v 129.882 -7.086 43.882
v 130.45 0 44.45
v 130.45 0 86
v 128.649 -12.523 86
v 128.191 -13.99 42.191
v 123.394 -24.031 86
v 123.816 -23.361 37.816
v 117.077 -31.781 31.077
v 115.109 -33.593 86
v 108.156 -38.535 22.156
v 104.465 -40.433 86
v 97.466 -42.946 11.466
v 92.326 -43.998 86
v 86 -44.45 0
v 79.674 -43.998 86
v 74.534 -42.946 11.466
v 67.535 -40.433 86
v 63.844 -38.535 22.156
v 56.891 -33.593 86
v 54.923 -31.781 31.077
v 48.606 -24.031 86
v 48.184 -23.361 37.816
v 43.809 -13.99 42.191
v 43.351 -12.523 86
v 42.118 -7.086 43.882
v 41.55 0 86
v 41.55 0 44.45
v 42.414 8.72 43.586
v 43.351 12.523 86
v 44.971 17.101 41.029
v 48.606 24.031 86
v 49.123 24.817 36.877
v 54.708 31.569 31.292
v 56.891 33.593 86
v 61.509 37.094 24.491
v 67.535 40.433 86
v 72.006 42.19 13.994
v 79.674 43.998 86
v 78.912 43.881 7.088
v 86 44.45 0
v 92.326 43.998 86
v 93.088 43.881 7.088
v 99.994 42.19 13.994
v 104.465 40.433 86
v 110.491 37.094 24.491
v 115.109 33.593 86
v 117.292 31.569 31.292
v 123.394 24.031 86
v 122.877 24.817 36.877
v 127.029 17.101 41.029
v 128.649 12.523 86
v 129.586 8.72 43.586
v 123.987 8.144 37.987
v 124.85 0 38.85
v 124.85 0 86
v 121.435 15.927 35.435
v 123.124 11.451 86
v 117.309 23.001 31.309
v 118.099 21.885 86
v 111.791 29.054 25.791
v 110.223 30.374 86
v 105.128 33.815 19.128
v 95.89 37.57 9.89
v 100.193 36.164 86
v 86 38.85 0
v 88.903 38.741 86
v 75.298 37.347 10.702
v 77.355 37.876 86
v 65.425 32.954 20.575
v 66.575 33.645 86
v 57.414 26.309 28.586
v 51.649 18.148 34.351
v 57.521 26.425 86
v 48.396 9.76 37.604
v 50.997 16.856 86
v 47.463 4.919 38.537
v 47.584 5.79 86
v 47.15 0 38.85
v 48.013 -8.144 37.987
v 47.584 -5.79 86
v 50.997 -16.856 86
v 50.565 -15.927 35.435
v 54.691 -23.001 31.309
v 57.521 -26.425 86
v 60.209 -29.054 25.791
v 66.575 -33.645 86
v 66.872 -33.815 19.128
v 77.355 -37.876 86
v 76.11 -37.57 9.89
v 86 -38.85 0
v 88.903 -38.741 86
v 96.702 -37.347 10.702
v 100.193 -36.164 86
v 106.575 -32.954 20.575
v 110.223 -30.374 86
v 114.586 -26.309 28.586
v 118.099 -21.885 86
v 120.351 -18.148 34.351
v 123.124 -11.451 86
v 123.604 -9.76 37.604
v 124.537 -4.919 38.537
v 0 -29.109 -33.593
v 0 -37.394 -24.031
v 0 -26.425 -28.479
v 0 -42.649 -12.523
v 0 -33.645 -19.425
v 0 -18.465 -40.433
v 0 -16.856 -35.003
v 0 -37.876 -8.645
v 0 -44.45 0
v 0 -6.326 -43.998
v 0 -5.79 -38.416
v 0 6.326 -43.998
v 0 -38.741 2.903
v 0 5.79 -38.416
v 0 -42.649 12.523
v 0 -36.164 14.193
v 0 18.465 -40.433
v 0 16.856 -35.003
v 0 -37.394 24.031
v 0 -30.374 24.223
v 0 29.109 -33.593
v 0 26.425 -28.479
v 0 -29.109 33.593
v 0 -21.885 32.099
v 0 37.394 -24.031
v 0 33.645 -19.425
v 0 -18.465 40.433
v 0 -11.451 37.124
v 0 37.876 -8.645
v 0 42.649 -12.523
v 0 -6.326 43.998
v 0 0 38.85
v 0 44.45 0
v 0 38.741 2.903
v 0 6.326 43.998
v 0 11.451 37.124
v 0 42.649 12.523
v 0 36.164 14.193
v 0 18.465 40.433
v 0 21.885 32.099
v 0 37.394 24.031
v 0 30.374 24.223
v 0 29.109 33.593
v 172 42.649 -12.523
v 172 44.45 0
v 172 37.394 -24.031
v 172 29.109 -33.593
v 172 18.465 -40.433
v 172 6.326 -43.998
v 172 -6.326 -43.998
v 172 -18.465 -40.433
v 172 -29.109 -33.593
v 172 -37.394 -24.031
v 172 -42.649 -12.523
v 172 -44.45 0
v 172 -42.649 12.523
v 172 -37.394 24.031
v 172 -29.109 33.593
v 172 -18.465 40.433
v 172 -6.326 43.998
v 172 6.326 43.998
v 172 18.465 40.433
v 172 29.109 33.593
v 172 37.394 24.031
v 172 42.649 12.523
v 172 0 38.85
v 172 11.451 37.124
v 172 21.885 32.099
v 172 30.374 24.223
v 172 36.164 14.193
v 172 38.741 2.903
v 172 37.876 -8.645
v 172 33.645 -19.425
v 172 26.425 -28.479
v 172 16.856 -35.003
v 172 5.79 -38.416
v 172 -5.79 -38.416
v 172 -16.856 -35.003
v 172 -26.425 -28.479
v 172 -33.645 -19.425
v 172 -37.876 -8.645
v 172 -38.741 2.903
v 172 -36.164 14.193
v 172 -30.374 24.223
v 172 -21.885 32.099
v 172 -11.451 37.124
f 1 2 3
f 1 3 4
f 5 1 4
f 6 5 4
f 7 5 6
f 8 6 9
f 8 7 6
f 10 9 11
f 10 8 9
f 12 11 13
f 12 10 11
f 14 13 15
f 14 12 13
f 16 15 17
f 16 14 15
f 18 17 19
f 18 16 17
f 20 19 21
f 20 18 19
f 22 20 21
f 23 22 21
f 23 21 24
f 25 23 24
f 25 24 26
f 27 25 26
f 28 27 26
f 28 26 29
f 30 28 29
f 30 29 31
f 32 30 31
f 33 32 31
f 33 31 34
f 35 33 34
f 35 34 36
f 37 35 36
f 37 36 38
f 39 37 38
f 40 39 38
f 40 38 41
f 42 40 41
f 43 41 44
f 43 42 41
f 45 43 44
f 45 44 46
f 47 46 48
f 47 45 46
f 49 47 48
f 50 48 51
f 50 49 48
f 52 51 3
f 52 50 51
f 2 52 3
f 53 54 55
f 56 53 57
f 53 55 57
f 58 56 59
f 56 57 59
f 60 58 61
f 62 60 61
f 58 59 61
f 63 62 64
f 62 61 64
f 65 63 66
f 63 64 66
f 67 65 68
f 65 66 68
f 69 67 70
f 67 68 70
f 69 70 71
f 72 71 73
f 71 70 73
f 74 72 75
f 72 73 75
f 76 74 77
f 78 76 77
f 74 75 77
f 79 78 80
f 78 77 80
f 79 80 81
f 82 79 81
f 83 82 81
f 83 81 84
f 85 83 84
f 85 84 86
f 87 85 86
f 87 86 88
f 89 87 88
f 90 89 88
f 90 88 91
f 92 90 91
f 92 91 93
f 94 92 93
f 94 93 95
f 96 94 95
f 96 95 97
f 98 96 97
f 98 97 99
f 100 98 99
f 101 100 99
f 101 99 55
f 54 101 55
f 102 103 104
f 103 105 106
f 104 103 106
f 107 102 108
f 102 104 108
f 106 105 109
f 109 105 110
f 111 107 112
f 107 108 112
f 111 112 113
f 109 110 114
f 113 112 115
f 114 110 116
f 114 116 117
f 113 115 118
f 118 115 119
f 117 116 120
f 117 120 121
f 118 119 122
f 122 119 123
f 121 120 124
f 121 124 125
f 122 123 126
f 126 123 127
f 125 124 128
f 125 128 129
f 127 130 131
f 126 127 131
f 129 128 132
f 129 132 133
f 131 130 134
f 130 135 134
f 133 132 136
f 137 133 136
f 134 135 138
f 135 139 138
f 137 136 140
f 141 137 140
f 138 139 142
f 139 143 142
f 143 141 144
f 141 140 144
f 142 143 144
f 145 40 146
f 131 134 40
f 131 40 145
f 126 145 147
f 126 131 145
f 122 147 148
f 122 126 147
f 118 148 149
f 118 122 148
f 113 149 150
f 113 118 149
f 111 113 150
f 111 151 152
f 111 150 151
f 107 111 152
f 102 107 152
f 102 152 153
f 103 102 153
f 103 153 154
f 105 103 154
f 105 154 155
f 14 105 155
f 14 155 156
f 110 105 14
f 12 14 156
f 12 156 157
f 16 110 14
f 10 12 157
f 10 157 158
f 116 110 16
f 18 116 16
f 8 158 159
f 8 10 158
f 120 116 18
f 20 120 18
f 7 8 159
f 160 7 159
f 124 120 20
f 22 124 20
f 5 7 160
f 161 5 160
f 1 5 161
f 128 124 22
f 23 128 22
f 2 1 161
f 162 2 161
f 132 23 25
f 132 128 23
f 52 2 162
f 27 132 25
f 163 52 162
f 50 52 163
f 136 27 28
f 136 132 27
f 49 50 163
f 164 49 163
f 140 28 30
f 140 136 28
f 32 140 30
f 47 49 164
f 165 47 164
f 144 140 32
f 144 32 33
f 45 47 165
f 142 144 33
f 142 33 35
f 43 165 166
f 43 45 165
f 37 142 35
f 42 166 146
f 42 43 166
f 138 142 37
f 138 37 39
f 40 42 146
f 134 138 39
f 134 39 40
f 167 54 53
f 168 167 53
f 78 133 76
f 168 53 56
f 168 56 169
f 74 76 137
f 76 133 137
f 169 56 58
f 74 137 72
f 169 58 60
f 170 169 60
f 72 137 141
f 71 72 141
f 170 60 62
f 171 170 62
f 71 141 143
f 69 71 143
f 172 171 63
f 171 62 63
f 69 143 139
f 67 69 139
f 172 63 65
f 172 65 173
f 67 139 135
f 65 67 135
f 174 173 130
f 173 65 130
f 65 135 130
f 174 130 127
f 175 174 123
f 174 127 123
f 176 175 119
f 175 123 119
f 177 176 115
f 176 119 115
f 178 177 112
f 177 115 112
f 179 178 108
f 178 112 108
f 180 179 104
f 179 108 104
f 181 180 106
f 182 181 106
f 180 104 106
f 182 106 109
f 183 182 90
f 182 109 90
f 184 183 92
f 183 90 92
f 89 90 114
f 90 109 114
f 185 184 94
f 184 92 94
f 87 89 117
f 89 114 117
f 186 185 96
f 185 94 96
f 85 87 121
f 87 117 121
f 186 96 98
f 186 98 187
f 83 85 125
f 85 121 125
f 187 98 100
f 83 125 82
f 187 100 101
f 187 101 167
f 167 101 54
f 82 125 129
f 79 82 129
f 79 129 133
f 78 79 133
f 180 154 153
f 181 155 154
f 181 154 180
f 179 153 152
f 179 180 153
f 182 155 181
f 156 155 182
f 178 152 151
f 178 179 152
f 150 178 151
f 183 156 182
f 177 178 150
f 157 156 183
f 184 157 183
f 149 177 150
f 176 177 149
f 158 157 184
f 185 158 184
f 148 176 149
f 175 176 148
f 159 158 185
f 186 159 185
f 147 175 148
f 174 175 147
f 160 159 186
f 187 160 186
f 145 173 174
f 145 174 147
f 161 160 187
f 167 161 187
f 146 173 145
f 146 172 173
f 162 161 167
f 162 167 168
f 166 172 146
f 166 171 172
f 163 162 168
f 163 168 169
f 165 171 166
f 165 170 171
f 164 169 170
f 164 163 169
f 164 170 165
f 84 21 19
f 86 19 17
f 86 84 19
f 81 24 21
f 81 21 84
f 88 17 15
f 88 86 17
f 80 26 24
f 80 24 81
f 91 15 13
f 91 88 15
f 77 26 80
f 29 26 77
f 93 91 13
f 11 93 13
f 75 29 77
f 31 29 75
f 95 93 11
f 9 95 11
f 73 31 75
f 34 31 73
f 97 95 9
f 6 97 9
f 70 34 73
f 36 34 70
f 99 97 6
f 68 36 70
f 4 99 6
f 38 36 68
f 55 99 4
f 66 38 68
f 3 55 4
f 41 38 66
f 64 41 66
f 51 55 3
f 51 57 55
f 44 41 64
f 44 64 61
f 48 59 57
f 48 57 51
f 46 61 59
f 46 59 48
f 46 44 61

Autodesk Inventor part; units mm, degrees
ref_plane "YZ Plane" through (0, 0, 0) normal (1, 0, 0) x (0, 1, 0)
ref_plane "XZ Plane" through (0, 0, 0) normal (0, 1, 0) x (-1, 0, 0)
ref_plane "XY Plane" through (0, 0, 0) normal (0, 0, 1) x (1, 0, 0)
sketch "Sketch1" plane through (0, 0, 0) normal (1, 0, 0) x (0, 1, 0)
  circle A0 centre (0, 0) radius 44.45
  dimension "d0" = 88.9
extrude "Extrude1" add sketch "Sketch1" along normal blind 172
sketch "Sketch2" plane through (0, 0, 0) normal (0, 0, 1) x (1, 0, 0)
  line L0 (0, 44.45) -> (0, -44.45) projected
  line L1 (172, 44.45) -> (172, -44.45) projected
  line L2 (0, 0) -> (172, 0) construction
  circle A0 centre (86, 0) radius 44.45
  dimension "d3" = 88.9
extrude "Extrude2" add sketch "Sketch2" along normal blind 86
sketch "Sketch3" plane through (0, 0, 0) normal (-1, 0, 0) x (0, 0, 1)
  circle A0 centre (0, 0) radius 44.45 projected
  circle A1 centre (0, 0) radius 38.85
  dimension "d6" = 77.7
extrude "Extrude3" cut sketch "Sketch3" against normal through all contours A1
sketch "Sketch4" plane through (86, 0, 86) normal (0, 0, 1) x (1, 0, 0)
  circle A0 centre (0, 0) radius 44.45 projected
  circle A1 centre (0, 0) radius 38.85
  dimension "d9" = 77.7
extrude "Extrude4" cut sketch "Sketch4" against normal up to next contours A1
equation "\"d0\" = d"
equation "\"d1\" = 2 * a"
equation "\"d3\" = d"
equation "\"d4\" = a"
equation "\"d6\" = d - 2 * s1"
equation "\"d7\" = a"
equation "\"d9\" = d - 2 * s1"
equation "\"d10\" = a"
equation "\"d\" = 88.9"
equation "\"s1\" = 5.6"
equation "\"a\" = 86"
equation "\"Size_Designation\" = 1.2345"
properties part number "DIN 2615-1 Tee 88.9 x 5.6 S" material "Steel"
